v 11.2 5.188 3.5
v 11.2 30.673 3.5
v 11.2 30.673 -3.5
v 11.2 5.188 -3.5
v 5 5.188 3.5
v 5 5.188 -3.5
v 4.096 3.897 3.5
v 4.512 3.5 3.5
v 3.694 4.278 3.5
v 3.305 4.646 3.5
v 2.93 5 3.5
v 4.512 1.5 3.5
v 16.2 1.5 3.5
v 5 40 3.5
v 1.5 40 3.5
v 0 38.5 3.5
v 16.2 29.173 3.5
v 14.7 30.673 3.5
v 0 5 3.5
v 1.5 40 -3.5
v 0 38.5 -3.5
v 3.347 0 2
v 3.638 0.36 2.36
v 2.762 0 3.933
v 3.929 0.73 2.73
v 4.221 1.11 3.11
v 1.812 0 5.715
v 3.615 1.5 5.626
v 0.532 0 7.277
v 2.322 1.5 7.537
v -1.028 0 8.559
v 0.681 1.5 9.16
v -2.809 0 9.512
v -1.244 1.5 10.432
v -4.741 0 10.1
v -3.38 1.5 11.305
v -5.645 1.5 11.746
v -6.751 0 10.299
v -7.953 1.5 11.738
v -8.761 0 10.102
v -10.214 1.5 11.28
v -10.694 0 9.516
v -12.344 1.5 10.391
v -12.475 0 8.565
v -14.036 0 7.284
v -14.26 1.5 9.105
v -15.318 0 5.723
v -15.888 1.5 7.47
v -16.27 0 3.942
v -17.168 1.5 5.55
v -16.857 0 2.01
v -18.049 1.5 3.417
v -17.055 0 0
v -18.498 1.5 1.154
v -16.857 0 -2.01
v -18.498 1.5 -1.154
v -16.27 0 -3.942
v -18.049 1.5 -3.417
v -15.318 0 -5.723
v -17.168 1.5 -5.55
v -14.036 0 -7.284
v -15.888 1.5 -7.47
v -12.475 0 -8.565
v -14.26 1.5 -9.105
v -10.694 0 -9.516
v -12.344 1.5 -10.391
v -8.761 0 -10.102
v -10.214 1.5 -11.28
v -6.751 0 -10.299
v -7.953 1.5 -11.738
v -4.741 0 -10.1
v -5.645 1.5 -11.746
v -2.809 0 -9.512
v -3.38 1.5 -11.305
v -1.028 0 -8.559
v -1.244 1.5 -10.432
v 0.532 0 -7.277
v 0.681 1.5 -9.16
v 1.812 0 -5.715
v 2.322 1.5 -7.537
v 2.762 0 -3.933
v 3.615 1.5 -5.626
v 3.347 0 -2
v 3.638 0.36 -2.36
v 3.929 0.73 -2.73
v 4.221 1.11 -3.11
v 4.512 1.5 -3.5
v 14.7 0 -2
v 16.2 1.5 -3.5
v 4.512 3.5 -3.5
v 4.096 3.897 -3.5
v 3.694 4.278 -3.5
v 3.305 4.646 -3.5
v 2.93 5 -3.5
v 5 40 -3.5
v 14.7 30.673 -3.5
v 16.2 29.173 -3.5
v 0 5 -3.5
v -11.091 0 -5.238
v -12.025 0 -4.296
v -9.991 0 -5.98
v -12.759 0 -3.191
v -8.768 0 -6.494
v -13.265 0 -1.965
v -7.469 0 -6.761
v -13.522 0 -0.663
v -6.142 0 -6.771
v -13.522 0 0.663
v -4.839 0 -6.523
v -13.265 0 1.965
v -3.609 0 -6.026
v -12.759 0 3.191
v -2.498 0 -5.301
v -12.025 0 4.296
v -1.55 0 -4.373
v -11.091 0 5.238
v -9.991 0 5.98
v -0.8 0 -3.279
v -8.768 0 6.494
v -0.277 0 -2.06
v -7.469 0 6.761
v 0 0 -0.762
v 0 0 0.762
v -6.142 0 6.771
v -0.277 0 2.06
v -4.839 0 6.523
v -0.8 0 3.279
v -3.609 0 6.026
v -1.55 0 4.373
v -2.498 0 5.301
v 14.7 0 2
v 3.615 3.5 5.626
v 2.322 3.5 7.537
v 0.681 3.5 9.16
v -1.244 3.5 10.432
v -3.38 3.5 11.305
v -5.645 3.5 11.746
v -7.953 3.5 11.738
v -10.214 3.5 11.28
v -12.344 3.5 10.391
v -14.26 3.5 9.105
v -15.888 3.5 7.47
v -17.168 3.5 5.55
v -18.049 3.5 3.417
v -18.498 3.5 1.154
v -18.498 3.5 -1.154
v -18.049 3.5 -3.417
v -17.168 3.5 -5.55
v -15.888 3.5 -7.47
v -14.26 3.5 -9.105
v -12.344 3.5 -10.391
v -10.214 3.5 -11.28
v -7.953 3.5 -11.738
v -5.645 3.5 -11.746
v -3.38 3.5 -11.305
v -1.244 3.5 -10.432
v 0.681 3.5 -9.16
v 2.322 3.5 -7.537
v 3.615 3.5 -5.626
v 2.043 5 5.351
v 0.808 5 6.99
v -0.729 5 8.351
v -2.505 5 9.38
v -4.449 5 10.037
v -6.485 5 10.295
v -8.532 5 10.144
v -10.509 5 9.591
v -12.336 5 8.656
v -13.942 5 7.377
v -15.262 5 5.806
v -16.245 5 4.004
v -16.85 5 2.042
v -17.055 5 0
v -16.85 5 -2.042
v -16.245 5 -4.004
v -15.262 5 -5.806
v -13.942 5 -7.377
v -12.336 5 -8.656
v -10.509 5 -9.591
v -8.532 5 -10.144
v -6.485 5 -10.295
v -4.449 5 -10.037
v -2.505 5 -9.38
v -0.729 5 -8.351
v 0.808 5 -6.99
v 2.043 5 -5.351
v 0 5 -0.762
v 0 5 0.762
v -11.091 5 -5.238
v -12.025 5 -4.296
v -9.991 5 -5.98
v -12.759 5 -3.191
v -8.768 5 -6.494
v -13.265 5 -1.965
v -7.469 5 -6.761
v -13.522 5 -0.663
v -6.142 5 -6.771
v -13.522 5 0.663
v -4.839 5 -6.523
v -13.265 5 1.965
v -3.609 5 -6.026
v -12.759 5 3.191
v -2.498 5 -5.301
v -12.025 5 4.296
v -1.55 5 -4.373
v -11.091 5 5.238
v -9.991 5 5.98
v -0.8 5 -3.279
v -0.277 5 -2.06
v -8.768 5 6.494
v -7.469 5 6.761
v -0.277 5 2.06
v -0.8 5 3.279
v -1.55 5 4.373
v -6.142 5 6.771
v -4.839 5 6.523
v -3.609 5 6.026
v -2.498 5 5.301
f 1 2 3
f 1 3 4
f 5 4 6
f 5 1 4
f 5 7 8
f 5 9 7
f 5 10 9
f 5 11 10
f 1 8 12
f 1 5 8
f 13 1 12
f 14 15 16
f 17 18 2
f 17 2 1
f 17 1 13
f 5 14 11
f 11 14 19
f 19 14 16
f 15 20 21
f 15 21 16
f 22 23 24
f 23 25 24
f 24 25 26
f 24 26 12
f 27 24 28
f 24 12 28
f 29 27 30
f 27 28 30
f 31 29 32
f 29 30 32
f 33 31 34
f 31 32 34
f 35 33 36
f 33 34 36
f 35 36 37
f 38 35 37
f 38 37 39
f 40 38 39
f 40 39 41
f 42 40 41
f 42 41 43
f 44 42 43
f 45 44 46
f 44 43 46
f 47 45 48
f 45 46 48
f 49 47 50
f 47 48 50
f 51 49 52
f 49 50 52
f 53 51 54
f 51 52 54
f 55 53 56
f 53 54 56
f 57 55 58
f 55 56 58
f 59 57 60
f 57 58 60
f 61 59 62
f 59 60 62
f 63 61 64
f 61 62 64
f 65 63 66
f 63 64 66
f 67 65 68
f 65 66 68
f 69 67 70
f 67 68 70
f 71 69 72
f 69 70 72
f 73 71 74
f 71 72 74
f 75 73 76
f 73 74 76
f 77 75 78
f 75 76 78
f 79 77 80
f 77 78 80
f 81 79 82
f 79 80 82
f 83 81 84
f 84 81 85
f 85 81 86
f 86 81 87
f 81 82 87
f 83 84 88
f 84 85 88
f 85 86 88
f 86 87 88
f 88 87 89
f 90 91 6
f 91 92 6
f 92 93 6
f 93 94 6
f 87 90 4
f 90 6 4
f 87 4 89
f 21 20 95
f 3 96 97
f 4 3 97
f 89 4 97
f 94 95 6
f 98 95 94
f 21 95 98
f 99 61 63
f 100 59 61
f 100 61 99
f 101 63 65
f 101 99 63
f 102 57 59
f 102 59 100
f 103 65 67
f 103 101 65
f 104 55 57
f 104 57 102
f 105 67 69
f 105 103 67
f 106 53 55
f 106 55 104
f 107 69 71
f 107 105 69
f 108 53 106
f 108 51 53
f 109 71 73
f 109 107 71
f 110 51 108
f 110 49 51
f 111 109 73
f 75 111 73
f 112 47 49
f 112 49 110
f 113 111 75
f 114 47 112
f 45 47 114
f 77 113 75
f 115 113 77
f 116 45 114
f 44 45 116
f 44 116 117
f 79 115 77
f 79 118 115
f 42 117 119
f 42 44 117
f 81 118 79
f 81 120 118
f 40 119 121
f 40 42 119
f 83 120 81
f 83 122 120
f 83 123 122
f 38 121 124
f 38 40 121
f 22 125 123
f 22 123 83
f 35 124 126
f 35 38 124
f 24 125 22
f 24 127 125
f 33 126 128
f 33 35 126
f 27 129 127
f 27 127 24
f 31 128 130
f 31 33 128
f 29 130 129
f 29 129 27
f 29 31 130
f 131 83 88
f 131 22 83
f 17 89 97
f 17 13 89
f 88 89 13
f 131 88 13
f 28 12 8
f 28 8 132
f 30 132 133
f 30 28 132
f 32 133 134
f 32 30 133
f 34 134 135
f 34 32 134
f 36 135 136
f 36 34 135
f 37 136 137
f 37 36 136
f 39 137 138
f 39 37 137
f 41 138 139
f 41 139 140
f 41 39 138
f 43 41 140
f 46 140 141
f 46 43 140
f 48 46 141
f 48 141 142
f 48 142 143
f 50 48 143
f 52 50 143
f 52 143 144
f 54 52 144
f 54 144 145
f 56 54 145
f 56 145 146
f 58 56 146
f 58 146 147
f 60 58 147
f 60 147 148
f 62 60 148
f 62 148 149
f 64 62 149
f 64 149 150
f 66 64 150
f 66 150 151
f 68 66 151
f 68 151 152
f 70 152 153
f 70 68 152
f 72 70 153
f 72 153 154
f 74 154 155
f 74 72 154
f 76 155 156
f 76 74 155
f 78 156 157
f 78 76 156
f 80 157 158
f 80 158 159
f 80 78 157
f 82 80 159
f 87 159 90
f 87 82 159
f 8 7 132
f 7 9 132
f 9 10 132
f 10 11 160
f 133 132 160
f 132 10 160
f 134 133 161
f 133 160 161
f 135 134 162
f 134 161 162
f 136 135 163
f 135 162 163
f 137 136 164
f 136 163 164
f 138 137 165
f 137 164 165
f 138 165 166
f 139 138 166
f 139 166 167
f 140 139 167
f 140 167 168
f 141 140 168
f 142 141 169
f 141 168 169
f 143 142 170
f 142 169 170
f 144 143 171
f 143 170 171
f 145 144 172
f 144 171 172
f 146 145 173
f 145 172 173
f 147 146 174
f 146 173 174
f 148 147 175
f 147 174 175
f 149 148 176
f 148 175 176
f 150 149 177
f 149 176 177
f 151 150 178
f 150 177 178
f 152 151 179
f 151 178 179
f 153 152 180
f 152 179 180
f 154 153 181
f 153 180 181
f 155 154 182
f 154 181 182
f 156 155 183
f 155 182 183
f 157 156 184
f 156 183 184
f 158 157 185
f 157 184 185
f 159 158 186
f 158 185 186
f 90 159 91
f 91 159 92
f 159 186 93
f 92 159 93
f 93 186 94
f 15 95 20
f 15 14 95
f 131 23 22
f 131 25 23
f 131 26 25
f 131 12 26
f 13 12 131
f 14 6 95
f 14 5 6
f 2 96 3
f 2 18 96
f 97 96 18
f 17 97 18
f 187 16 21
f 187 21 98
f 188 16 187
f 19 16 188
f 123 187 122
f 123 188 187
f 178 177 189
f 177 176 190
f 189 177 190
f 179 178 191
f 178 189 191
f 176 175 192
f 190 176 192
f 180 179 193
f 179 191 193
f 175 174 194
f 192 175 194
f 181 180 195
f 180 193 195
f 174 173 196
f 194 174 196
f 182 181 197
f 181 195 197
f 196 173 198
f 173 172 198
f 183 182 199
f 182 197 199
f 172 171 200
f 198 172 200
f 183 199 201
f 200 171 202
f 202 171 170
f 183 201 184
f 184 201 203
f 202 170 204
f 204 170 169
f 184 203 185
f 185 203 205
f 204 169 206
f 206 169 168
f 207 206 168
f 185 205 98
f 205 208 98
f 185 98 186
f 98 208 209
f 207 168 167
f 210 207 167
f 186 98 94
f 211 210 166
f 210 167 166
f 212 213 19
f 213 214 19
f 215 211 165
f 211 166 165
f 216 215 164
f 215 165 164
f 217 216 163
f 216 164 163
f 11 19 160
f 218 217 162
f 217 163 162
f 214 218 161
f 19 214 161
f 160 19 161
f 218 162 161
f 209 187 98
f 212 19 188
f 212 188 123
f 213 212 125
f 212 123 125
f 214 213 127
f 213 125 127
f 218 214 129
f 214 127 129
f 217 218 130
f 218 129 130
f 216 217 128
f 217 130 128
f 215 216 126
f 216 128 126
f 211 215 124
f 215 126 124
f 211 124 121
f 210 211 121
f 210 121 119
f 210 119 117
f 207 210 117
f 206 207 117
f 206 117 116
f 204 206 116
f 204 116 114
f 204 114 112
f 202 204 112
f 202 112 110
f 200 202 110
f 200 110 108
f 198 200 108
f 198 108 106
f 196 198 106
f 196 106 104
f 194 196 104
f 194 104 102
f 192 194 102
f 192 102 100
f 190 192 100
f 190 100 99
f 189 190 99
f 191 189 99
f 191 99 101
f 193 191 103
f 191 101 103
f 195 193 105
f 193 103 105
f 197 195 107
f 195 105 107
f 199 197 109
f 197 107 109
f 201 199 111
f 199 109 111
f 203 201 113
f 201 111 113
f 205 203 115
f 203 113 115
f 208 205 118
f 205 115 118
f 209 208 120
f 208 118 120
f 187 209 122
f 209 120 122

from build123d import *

# Parameters (mm, degrees)
F2_DEPTH = 3.5
F1_R     = 11.798714
F1_R_2   = 6.798714
F3_DEPTH = 5
F4_SIZE  = 1.5


with BuildPart() as f2:
    # F0 (on Top) → F2 (new body, symmetric)
    with BuildSketch(Plane.XY):
        Polygon((5, 40), (0, 40), (0, 0), (16.2, 0), (16.2, 30.672841), (11.2, 30.672841), (11.2, 5.187817), (5, 5.187817), align=None)
    extrude(amount=F2_DEPTH, both=True)

    # F1 (on Front) → F3 (join)
    with BuildSketch(Plane.XZ):
        with Locations((-6.755837, 0)):
            Circle(F1_R)
        with Locations((-6.755837, 0)):
            Circle(F1_R_2, mode=Mode.SUBTRACT)
    extrude(amount=-F3_DEPTH)

    # F4
    f4_edges = [f2.edges().sort_by_distance(p)[0] for p in [
        (-18.554551, 0, 0),
        (-18.554551, 5, 0),
        (16.2, 0, 0),
        (10.3559, 0, -3.5),
        (10.3559, 0, 3.5),
        (16.2, 30.672841, 0),
        (0, 40, 0),
    ]]
    chamfer(f4_edges, length=F4_SIZE)


solid = f2.part
